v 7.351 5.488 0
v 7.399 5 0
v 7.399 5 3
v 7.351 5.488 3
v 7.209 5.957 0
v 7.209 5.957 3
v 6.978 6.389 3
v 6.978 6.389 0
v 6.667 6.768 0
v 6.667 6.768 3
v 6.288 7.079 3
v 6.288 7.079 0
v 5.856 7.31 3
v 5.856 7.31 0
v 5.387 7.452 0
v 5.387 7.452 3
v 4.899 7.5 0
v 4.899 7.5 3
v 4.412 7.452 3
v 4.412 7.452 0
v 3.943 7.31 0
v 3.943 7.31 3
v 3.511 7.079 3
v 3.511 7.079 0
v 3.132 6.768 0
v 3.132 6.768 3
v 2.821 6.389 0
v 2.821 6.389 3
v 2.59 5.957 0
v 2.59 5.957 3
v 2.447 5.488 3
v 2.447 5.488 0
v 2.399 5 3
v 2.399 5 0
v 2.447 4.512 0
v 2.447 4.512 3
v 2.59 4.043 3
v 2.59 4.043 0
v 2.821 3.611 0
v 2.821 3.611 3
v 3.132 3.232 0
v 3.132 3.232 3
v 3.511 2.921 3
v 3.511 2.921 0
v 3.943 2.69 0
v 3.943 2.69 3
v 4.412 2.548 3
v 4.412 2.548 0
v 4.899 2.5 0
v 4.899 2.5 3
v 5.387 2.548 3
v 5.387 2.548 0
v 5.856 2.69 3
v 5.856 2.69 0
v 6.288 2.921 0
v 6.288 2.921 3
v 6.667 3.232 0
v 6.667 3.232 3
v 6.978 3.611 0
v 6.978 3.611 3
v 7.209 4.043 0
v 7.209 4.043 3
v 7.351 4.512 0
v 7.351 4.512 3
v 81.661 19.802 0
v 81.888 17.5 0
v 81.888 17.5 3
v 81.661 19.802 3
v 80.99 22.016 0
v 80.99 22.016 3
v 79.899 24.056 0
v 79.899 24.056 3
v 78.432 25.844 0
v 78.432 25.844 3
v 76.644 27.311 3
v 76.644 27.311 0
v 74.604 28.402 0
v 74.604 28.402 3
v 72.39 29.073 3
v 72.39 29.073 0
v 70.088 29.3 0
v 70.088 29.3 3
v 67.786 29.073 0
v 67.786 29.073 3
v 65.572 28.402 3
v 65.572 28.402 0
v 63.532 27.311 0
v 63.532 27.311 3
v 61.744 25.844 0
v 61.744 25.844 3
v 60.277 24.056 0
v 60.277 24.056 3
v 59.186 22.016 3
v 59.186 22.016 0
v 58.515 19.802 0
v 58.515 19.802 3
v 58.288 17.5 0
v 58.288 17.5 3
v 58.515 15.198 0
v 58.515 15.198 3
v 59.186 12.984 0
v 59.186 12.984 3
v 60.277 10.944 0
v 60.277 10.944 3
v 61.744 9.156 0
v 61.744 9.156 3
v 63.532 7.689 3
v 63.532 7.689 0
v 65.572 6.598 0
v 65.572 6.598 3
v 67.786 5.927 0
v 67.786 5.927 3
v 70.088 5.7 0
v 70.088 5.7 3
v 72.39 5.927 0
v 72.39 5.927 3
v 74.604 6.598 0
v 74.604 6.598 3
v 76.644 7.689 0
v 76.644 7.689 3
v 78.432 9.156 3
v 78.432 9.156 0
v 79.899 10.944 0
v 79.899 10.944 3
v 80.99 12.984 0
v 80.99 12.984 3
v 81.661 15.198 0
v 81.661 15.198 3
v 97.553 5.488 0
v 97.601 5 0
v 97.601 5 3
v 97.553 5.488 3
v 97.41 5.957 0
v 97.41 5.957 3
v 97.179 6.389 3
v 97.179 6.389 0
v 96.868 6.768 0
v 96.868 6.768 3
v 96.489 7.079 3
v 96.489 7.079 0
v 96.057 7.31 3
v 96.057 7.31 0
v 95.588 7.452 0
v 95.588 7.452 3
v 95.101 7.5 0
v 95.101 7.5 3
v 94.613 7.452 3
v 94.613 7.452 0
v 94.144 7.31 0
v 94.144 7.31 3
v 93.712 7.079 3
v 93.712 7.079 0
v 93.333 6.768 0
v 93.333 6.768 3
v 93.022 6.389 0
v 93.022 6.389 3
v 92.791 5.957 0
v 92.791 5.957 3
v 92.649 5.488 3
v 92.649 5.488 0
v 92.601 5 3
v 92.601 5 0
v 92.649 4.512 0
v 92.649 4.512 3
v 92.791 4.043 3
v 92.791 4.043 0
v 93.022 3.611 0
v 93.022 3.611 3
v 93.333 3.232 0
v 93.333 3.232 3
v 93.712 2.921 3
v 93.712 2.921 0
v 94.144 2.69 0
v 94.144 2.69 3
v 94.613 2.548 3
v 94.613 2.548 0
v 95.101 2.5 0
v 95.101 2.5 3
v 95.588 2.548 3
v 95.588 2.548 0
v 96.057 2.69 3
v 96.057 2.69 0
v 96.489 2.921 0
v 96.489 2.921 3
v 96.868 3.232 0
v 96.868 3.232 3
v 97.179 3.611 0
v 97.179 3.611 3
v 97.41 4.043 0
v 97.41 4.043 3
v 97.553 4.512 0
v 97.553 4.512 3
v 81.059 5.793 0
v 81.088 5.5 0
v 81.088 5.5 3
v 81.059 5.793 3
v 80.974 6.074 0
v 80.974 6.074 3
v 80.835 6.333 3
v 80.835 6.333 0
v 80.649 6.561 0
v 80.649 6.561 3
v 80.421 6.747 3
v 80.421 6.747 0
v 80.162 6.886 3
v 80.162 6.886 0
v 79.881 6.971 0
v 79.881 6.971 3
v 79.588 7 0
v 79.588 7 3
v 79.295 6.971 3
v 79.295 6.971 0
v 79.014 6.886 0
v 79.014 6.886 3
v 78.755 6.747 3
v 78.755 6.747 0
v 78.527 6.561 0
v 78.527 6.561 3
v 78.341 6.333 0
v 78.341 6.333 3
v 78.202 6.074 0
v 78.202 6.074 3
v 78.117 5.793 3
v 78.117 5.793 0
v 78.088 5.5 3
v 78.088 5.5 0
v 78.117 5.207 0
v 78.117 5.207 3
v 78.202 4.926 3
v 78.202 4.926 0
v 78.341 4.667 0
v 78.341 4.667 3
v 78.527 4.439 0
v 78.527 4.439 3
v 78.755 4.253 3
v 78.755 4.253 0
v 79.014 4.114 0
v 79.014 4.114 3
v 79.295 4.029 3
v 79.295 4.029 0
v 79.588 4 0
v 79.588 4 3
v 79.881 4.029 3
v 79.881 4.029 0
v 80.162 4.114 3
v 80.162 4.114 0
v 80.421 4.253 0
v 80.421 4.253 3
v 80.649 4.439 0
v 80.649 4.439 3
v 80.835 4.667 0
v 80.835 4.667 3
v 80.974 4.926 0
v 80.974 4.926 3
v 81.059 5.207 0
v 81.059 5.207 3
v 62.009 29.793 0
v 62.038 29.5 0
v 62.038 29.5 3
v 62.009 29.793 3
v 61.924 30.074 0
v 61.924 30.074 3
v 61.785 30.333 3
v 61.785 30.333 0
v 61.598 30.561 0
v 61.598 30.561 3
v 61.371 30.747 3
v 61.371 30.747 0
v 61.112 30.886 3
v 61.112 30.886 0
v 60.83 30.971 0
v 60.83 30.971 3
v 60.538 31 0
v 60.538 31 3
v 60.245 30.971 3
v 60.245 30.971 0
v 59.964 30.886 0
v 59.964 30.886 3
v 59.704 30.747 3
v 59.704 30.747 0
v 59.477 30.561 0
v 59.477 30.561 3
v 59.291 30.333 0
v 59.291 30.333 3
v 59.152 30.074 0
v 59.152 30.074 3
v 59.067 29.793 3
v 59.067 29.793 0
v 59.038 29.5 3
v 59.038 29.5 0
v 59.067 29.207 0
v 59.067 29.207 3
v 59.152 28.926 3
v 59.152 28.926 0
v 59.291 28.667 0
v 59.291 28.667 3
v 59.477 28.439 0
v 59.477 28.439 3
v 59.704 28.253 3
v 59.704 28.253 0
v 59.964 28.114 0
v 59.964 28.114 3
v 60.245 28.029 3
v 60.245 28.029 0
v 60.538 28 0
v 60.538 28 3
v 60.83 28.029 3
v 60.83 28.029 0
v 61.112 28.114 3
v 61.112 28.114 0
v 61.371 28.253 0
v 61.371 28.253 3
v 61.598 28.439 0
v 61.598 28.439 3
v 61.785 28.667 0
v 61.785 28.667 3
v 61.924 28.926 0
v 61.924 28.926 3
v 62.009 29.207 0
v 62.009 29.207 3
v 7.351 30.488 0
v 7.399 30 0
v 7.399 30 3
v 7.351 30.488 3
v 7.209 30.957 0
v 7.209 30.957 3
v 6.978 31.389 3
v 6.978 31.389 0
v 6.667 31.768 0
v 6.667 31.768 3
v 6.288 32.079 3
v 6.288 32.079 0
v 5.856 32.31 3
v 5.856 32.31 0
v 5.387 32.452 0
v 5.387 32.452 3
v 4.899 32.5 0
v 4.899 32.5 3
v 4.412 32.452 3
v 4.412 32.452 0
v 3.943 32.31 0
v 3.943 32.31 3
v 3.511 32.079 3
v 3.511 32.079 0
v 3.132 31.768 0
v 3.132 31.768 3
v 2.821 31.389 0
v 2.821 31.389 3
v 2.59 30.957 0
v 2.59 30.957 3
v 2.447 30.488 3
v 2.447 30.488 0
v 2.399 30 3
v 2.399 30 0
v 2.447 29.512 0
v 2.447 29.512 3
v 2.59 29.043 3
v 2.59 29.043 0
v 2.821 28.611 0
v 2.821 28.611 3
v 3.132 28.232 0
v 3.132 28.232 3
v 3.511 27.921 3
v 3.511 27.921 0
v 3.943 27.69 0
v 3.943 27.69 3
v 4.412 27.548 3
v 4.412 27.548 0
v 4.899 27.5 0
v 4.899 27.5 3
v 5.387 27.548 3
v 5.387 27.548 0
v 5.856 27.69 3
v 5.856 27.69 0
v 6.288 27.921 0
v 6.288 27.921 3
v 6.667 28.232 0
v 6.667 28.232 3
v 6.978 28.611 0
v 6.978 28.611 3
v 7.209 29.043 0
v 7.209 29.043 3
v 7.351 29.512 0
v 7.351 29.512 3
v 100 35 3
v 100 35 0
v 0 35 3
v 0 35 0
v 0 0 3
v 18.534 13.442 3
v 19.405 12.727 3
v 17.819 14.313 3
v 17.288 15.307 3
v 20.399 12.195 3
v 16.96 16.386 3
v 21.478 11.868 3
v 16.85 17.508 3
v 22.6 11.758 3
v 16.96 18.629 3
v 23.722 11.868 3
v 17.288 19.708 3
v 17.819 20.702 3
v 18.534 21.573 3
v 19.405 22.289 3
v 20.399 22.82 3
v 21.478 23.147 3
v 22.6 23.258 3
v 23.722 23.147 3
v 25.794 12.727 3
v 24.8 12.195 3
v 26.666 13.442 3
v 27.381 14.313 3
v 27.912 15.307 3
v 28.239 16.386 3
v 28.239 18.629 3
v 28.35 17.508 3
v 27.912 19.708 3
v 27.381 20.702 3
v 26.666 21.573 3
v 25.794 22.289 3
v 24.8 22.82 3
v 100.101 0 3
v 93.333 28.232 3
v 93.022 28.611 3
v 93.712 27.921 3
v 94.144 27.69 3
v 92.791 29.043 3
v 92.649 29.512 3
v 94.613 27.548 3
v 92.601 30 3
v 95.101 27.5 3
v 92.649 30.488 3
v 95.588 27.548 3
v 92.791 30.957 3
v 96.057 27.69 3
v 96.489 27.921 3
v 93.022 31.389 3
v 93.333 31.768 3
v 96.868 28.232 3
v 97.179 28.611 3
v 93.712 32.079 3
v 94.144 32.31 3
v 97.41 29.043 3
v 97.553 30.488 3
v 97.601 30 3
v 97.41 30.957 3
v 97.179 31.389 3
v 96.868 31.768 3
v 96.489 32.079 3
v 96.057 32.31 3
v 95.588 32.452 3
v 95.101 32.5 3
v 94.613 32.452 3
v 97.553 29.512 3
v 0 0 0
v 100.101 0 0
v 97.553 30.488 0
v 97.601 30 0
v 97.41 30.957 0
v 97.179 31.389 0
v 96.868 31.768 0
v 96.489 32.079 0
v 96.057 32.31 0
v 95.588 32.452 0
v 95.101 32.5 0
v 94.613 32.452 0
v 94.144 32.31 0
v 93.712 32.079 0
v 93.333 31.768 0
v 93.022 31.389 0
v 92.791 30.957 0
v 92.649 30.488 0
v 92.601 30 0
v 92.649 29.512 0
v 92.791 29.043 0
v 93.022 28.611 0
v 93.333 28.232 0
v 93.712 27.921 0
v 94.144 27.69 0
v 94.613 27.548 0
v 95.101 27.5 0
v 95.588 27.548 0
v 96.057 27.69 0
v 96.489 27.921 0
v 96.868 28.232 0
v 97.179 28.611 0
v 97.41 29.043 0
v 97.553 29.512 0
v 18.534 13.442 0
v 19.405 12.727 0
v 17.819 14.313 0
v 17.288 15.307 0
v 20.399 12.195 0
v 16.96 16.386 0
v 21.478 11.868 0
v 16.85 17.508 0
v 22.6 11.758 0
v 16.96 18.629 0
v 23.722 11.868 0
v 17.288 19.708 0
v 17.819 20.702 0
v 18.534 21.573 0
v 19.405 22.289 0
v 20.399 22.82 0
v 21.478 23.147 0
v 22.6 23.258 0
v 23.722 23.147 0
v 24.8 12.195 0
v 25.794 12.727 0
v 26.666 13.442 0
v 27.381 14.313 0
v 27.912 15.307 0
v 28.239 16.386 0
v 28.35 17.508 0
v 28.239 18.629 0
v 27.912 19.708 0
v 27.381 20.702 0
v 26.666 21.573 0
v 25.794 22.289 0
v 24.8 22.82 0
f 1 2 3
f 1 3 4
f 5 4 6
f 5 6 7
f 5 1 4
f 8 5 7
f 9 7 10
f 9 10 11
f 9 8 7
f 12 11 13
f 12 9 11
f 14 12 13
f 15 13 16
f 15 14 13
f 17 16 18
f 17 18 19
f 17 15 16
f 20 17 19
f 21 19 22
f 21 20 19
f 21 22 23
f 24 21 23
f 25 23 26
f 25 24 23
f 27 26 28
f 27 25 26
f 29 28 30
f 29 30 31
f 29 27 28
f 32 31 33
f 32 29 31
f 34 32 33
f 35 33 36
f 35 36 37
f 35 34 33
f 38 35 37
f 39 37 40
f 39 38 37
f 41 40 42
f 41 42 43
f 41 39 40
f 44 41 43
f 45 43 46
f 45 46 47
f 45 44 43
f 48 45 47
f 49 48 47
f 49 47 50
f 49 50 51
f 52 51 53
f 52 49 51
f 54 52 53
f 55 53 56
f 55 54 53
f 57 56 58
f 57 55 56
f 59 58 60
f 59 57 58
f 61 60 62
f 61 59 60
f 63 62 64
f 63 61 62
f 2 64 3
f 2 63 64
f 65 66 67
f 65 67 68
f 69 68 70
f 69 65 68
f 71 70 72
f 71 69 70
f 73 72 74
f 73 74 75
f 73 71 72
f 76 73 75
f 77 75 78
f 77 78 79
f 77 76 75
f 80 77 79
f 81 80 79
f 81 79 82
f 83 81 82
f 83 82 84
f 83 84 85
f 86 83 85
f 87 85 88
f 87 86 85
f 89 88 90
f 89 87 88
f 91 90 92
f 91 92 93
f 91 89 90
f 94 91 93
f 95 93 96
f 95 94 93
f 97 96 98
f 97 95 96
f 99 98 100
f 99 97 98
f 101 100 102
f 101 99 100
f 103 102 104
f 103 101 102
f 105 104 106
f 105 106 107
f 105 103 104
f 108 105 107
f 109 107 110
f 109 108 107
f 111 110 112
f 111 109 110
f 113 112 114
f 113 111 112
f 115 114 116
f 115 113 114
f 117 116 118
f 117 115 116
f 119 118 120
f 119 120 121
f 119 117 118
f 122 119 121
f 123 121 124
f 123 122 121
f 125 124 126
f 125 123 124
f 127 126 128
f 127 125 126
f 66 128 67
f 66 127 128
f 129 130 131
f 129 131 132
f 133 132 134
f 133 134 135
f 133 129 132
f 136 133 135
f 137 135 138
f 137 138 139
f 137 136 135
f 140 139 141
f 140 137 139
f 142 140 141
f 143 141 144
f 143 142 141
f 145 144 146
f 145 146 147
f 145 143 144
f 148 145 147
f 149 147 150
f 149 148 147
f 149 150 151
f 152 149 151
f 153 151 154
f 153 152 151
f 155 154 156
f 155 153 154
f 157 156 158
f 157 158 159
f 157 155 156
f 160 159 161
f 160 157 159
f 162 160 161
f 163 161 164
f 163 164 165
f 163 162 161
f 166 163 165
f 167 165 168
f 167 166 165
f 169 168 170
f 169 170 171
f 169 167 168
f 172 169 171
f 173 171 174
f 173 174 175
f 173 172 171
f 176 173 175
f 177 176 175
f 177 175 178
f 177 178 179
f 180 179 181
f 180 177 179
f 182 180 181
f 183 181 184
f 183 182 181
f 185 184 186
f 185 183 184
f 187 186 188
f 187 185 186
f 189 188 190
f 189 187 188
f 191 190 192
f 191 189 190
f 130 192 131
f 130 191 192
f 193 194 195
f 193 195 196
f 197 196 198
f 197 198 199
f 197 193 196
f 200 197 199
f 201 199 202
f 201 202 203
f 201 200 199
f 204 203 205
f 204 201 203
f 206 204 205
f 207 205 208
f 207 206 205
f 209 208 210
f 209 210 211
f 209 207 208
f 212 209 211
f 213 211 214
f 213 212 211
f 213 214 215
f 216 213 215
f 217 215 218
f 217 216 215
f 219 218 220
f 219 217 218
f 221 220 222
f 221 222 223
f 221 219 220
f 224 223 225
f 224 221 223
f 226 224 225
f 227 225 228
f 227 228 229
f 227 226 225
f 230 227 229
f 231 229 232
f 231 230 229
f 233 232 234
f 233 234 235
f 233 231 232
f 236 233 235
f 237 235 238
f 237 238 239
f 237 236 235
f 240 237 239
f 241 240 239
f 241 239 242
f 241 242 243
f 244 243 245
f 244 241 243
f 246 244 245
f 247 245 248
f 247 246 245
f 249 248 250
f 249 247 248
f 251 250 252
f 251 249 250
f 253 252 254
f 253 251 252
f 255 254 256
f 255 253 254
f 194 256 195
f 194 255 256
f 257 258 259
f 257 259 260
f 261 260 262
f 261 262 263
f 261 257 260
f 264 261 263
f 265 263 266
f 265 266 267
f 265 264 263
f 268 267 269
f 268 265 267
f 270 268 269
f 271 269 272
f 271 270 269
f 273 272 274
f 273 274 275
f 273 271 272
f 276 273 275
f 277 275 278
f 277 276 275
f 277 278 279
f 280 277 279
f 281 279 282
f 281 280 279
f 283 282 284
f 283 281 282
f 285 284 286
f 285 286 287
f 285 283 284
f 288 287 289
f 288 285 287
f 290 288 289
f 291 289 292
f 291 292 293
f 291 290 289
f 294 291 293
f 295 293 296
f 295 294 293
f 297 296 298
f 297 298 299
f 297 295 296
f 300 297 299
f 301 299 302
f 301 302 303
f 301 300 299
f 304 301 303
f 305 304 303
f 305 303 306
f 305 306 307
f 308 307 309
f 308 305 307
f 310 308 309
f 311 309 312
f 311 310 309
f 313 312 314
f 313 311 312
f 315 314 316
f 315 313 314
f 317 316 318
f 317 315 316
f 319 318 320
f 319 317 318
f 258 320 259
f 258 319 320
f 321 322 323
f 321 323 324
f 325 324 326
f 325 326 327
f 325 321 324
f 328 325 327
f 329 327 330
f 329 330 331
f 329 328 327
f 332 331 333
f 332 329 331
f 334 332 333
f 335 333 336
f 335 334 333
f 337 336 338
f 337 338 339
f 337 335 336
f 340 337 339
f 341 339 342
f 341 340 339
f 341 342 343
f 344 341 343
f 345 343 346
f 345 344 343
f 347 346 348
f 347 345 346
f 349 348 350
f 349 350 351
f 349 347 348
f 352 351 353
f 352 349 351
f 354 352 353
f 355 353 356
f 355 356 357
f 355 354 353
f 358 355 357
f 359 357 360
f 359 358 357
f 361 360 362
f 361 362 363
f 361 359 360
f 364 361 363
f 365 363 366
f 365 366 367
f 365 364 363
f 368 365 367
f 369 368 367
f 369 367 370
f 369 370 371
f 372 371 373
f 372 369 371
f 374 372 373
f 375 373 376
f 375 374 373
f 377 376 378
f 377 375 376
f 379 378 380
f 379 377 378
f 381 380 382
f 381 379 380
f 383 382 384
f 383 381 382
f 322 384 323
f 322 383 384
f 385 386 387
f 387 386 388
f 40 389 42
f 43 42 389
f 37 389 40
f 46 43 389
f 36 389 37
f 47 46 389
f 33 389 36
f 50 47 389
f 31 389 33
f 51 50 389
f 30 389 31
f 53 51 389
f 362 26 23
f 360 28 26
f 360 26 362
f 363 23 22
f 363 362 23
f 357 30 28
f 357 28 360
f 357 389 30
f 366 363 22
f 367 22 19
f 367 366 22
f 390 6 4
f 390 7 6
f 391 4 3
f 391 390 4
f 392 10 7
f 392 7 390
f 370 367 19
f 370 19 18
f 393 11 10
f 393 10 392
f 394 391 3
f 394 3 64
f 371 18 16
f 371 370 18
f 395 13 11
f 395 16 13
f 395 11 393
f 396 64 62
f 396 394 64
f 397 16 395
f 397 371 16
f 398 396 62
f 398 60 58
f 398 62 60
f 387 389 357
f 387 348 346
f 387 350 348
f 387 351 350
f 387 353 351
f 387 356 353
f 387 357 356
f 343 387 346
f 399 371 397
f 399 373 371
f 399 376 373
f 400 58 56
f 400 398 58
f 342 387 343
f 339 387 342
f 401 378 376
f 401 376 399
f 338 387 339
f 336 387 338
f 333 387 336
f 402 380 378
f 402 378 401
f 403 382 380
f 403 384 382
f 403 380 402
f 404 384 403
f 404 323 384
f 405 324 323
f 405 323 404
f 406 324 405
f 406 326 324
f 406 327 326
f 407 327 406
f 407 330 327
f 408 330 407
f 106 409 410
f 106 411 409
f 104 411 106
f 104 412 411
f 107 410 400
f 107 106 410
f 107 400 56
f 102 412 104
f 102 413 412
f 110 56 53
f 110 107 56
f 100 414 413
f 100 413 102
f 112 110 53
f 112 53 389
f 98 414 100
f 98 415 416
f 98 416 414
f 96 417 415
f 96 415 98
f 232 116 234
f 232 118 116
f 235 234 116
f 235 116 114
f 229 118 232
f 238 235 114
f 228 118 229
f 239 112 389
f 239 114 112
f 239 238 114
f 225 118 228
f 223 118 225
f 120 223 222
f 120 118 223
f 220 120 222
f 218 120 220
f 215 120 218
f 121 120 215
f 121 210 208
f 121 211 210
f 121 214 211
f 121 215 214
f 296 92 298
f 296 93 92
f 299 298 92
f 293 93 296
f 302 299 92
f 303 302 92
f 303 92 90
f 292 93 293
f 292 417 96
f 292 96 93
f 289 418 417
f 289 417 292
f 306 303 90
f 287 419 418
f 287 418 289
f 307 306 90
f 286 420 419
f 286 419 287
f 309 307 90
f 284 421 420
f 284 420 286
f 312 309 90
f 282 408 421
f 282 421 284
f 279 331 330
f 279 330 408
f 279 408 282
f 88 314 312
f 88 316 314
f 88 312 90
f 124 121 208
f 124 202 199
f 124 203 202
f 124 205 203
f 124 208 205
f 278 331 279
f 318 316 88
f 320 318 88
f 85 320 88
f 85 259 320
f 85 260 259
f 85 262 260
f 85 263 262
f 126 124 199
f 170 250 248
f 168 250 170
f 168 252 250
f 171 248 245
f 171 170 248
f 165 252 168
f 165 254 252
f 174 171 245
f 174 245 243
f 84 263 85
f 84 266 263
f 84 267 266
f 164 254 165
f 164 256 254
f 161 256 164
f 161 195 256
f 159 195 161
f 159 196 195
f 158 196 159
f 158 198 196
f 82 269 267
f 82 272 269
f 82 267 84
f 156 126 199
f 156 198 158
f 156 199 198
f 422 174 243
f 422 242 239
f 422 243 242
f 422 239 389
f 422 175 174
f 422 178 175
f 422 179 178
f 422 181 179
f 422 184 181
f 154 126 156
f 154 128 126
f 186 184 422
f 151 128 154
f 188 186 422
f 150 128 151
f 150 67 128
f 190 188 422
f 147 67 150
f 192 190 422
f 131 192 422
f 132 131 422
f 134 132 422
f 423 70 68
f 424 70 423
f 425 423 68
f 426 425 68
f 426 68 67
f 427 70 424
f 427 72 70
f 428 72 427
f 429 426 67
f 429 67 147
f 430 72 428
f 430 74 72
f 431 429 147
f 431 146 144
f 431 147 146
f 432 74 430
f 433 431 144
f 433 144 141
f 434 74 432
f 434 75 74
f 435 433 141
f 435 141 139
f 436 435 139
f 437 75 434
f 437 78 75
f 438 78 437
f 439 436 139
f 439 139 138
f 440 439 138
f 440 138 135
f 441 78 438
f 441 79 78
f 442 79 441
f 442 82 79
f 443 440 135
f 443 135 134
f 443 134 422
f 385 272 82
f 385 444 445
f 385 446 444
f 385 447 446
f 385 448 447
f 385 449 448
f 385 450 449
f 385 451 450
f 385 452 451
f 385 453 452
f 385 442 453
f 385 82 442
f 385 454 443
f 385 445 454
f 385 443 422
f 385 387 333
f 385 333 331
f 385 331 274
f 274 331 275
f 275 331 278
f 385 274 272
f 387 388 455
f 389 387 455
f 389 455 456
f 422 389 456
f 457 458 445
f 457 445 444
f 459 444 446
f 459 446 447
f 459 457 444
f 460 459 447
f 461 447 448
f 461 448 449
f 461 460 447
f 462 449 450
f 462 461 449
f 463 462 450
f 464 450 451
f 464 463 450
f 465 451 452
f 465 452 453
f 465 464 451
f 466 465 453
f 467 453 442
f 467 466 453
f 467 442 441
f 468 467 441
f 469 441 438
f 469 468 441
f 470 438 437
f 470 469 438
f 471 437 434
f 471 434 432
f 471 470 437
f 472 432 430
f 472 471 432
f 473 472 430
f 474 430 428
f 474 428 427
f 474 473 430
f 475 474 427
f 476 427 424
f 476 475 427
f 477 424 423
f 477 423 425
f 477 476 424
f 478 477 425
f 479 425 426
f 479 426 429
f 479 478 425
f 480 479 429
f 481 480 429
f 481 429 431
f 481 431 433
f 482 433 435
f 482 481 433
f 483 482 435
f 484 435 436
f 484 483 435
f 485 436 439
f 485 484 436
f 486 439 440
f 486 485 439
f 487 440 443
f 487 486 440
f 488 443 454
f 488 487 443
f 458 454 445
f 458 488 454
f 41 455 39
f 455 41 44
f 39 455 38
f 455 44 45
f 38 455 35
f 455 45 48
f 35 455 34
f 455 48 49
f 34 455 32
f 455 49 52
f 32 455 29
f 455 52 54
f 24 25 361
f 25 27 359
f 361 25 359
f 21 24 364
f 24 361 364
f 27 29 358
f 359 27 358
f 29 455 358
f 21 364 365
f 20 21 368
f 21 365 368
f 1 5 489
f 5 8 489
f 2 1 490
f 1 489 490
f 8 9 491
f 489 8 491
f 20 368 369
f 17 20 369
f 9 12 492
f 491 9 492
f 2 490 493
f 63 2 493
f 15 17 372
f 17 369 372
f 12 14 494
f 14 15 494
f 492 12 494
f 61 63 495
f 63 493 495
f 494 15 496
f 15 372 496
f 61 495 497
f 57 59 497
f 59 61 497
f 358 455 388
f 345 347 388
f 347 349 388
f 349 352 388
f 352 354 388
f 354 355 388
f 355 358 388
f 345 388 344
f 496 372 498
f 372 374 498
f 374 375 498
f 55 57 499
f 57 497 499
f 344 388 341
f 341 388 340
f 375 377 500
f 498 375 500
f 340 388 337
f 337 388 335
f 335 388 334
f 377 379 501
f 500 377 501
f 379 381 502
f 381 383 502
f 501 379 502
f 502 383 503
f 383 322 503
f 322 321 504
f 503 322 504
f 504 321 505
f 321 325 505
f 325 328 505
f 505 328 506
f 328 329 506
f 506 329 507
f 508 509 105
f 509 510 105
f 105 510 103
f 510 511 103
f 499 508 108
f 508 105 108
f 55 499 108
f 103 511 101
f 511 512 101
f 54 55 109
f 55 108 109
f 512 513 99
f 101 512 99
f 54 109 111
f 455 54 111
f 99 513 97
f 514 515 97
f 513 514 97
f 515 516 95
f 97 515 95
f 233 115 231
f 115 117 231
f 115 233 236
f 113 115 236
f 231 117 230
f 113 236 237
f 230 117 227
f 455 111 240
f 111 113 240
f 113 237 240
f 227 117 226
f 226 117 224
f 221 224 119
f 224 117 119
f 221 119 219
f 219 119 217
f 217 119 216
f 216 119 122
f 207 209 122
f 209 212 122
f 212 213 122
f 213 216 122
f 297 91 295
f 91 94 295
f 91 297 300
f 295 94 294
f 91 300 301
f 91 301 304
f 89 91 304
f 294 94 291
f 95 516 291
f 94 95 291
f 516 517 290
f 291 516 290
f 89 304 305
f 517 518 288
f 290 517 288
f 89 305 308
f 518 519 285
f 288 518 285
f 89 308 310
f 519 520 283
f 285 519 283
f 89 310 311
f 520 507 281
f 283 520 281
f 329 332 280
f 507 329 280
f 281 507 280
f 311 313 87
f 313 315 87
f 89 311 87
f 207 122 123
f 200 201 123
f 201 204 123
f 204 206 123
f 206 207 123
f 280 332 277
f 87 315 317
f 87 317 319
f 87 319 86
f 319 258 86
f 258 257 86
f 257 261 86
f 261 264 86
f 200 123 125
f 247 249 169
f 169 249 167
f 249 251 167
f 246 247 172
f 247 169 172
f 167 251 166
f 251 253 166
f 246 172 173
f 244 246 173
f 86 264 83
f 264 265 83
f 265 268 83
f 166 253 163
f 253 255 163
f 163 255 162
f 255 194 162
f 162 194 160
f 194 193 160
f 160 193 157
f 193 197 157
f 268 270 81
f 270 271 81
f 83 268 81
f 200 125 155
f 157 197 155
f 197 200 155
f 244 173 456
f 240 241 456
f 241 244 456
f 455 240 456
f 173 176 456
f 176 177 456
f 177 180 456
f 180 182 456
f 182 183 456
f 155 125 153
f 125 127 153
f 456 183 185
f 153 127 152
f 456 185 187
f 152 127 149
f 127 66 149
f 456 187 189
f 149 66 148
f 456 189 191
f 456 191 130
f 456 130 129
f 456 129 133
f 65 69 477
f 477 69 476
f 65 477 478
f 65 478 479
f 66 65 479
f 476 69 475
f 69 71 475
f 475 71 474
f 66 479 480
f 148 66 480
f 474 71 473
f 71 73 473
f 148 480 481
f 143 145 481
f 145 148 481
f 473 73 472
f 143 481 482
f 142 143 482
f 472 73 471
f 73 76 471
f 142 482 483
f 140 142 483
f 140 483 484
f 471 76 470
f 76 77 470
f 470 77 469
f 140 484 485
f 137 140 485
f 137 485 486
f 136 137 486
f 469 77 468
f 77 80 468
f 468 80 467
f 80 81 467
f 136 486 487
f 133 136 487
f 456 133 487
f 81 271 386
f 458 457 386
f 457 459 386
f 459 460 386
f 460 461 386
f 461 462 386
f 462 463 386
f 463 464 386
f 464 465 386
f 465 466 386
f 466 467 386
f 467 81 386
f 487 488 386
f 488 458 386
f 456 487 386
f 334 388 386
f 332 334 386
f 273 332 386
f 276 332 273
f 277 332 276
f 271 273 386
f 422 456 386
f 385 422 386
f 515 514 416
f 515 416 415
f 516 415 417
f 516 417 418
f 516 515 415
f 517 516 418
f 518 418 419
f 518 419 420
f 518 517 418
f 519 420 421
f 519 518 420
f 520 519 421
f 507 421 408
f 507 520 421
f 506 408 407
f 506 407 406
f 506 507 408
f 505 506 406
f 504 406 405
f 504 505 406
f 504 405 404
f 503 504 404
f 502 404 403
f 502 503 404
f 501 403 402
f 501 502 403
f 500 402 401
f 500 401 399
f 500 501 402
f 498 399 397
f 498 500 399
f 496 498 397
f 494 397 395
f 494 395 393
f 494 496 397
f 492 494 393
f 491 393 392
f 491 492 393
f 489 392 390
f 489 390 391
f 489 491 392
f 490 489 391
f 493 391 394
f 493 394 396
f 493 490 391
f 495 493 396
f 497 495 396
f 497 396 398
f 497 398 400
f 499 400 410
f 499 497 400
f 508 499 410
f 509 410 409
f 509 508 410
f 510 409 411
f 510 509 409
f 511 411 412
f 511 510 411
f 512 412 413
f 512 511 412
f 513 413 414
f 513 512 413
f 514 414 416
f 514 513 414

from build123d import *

# Parameters (mm, degrees)
F0_R     = 2.5
F0_R_2   = 1.5
F0_R_3   = 5.75
F0_R_4   = 11.8
F1_DEPTH = 3


with BuildPart() as f1:
    # F0 (on Top) → F1 (new body)
    with BuildSketch(Plane.XY):
        Polygon((100, 35), (0, 35), (0, 0), (100.10055, 0), align=None)
        with Locations((4.89945, 5)):
            Circle(F0_R, mode=Mode.SUBTRACT)
        with Locations((79.588087, 5.5)):
            Circle(F0_R_2, mode=Mode.SUBTRACT)
        with Locations((95.10055, 5)):
            Circle(F0_R, mode=Mode.SUBTRACT)
        with Locations((22.599816, 17.507559)):
            Circle(F0_R_3, mode=Mode.SUBTRACT)
        with Locations((4.89945, 30)):
            Circle(F0_R, mode=Mode.SUBTRACT)
        with Locations((70.088087, 17.5)):
            Circle(F0_R_4, mode=Mode.SUBTRACT)
        with Locations((60.537812, 29.5)):
            Circle(F0_R_2, mode=Mode.SUBTRACT)
        with Locations((95.10055, 30)):
            Circle(F0_R, mode=Mode.SUBTRACT)
    extrude(amount=F1_DEPTH)


solid = f1.part
